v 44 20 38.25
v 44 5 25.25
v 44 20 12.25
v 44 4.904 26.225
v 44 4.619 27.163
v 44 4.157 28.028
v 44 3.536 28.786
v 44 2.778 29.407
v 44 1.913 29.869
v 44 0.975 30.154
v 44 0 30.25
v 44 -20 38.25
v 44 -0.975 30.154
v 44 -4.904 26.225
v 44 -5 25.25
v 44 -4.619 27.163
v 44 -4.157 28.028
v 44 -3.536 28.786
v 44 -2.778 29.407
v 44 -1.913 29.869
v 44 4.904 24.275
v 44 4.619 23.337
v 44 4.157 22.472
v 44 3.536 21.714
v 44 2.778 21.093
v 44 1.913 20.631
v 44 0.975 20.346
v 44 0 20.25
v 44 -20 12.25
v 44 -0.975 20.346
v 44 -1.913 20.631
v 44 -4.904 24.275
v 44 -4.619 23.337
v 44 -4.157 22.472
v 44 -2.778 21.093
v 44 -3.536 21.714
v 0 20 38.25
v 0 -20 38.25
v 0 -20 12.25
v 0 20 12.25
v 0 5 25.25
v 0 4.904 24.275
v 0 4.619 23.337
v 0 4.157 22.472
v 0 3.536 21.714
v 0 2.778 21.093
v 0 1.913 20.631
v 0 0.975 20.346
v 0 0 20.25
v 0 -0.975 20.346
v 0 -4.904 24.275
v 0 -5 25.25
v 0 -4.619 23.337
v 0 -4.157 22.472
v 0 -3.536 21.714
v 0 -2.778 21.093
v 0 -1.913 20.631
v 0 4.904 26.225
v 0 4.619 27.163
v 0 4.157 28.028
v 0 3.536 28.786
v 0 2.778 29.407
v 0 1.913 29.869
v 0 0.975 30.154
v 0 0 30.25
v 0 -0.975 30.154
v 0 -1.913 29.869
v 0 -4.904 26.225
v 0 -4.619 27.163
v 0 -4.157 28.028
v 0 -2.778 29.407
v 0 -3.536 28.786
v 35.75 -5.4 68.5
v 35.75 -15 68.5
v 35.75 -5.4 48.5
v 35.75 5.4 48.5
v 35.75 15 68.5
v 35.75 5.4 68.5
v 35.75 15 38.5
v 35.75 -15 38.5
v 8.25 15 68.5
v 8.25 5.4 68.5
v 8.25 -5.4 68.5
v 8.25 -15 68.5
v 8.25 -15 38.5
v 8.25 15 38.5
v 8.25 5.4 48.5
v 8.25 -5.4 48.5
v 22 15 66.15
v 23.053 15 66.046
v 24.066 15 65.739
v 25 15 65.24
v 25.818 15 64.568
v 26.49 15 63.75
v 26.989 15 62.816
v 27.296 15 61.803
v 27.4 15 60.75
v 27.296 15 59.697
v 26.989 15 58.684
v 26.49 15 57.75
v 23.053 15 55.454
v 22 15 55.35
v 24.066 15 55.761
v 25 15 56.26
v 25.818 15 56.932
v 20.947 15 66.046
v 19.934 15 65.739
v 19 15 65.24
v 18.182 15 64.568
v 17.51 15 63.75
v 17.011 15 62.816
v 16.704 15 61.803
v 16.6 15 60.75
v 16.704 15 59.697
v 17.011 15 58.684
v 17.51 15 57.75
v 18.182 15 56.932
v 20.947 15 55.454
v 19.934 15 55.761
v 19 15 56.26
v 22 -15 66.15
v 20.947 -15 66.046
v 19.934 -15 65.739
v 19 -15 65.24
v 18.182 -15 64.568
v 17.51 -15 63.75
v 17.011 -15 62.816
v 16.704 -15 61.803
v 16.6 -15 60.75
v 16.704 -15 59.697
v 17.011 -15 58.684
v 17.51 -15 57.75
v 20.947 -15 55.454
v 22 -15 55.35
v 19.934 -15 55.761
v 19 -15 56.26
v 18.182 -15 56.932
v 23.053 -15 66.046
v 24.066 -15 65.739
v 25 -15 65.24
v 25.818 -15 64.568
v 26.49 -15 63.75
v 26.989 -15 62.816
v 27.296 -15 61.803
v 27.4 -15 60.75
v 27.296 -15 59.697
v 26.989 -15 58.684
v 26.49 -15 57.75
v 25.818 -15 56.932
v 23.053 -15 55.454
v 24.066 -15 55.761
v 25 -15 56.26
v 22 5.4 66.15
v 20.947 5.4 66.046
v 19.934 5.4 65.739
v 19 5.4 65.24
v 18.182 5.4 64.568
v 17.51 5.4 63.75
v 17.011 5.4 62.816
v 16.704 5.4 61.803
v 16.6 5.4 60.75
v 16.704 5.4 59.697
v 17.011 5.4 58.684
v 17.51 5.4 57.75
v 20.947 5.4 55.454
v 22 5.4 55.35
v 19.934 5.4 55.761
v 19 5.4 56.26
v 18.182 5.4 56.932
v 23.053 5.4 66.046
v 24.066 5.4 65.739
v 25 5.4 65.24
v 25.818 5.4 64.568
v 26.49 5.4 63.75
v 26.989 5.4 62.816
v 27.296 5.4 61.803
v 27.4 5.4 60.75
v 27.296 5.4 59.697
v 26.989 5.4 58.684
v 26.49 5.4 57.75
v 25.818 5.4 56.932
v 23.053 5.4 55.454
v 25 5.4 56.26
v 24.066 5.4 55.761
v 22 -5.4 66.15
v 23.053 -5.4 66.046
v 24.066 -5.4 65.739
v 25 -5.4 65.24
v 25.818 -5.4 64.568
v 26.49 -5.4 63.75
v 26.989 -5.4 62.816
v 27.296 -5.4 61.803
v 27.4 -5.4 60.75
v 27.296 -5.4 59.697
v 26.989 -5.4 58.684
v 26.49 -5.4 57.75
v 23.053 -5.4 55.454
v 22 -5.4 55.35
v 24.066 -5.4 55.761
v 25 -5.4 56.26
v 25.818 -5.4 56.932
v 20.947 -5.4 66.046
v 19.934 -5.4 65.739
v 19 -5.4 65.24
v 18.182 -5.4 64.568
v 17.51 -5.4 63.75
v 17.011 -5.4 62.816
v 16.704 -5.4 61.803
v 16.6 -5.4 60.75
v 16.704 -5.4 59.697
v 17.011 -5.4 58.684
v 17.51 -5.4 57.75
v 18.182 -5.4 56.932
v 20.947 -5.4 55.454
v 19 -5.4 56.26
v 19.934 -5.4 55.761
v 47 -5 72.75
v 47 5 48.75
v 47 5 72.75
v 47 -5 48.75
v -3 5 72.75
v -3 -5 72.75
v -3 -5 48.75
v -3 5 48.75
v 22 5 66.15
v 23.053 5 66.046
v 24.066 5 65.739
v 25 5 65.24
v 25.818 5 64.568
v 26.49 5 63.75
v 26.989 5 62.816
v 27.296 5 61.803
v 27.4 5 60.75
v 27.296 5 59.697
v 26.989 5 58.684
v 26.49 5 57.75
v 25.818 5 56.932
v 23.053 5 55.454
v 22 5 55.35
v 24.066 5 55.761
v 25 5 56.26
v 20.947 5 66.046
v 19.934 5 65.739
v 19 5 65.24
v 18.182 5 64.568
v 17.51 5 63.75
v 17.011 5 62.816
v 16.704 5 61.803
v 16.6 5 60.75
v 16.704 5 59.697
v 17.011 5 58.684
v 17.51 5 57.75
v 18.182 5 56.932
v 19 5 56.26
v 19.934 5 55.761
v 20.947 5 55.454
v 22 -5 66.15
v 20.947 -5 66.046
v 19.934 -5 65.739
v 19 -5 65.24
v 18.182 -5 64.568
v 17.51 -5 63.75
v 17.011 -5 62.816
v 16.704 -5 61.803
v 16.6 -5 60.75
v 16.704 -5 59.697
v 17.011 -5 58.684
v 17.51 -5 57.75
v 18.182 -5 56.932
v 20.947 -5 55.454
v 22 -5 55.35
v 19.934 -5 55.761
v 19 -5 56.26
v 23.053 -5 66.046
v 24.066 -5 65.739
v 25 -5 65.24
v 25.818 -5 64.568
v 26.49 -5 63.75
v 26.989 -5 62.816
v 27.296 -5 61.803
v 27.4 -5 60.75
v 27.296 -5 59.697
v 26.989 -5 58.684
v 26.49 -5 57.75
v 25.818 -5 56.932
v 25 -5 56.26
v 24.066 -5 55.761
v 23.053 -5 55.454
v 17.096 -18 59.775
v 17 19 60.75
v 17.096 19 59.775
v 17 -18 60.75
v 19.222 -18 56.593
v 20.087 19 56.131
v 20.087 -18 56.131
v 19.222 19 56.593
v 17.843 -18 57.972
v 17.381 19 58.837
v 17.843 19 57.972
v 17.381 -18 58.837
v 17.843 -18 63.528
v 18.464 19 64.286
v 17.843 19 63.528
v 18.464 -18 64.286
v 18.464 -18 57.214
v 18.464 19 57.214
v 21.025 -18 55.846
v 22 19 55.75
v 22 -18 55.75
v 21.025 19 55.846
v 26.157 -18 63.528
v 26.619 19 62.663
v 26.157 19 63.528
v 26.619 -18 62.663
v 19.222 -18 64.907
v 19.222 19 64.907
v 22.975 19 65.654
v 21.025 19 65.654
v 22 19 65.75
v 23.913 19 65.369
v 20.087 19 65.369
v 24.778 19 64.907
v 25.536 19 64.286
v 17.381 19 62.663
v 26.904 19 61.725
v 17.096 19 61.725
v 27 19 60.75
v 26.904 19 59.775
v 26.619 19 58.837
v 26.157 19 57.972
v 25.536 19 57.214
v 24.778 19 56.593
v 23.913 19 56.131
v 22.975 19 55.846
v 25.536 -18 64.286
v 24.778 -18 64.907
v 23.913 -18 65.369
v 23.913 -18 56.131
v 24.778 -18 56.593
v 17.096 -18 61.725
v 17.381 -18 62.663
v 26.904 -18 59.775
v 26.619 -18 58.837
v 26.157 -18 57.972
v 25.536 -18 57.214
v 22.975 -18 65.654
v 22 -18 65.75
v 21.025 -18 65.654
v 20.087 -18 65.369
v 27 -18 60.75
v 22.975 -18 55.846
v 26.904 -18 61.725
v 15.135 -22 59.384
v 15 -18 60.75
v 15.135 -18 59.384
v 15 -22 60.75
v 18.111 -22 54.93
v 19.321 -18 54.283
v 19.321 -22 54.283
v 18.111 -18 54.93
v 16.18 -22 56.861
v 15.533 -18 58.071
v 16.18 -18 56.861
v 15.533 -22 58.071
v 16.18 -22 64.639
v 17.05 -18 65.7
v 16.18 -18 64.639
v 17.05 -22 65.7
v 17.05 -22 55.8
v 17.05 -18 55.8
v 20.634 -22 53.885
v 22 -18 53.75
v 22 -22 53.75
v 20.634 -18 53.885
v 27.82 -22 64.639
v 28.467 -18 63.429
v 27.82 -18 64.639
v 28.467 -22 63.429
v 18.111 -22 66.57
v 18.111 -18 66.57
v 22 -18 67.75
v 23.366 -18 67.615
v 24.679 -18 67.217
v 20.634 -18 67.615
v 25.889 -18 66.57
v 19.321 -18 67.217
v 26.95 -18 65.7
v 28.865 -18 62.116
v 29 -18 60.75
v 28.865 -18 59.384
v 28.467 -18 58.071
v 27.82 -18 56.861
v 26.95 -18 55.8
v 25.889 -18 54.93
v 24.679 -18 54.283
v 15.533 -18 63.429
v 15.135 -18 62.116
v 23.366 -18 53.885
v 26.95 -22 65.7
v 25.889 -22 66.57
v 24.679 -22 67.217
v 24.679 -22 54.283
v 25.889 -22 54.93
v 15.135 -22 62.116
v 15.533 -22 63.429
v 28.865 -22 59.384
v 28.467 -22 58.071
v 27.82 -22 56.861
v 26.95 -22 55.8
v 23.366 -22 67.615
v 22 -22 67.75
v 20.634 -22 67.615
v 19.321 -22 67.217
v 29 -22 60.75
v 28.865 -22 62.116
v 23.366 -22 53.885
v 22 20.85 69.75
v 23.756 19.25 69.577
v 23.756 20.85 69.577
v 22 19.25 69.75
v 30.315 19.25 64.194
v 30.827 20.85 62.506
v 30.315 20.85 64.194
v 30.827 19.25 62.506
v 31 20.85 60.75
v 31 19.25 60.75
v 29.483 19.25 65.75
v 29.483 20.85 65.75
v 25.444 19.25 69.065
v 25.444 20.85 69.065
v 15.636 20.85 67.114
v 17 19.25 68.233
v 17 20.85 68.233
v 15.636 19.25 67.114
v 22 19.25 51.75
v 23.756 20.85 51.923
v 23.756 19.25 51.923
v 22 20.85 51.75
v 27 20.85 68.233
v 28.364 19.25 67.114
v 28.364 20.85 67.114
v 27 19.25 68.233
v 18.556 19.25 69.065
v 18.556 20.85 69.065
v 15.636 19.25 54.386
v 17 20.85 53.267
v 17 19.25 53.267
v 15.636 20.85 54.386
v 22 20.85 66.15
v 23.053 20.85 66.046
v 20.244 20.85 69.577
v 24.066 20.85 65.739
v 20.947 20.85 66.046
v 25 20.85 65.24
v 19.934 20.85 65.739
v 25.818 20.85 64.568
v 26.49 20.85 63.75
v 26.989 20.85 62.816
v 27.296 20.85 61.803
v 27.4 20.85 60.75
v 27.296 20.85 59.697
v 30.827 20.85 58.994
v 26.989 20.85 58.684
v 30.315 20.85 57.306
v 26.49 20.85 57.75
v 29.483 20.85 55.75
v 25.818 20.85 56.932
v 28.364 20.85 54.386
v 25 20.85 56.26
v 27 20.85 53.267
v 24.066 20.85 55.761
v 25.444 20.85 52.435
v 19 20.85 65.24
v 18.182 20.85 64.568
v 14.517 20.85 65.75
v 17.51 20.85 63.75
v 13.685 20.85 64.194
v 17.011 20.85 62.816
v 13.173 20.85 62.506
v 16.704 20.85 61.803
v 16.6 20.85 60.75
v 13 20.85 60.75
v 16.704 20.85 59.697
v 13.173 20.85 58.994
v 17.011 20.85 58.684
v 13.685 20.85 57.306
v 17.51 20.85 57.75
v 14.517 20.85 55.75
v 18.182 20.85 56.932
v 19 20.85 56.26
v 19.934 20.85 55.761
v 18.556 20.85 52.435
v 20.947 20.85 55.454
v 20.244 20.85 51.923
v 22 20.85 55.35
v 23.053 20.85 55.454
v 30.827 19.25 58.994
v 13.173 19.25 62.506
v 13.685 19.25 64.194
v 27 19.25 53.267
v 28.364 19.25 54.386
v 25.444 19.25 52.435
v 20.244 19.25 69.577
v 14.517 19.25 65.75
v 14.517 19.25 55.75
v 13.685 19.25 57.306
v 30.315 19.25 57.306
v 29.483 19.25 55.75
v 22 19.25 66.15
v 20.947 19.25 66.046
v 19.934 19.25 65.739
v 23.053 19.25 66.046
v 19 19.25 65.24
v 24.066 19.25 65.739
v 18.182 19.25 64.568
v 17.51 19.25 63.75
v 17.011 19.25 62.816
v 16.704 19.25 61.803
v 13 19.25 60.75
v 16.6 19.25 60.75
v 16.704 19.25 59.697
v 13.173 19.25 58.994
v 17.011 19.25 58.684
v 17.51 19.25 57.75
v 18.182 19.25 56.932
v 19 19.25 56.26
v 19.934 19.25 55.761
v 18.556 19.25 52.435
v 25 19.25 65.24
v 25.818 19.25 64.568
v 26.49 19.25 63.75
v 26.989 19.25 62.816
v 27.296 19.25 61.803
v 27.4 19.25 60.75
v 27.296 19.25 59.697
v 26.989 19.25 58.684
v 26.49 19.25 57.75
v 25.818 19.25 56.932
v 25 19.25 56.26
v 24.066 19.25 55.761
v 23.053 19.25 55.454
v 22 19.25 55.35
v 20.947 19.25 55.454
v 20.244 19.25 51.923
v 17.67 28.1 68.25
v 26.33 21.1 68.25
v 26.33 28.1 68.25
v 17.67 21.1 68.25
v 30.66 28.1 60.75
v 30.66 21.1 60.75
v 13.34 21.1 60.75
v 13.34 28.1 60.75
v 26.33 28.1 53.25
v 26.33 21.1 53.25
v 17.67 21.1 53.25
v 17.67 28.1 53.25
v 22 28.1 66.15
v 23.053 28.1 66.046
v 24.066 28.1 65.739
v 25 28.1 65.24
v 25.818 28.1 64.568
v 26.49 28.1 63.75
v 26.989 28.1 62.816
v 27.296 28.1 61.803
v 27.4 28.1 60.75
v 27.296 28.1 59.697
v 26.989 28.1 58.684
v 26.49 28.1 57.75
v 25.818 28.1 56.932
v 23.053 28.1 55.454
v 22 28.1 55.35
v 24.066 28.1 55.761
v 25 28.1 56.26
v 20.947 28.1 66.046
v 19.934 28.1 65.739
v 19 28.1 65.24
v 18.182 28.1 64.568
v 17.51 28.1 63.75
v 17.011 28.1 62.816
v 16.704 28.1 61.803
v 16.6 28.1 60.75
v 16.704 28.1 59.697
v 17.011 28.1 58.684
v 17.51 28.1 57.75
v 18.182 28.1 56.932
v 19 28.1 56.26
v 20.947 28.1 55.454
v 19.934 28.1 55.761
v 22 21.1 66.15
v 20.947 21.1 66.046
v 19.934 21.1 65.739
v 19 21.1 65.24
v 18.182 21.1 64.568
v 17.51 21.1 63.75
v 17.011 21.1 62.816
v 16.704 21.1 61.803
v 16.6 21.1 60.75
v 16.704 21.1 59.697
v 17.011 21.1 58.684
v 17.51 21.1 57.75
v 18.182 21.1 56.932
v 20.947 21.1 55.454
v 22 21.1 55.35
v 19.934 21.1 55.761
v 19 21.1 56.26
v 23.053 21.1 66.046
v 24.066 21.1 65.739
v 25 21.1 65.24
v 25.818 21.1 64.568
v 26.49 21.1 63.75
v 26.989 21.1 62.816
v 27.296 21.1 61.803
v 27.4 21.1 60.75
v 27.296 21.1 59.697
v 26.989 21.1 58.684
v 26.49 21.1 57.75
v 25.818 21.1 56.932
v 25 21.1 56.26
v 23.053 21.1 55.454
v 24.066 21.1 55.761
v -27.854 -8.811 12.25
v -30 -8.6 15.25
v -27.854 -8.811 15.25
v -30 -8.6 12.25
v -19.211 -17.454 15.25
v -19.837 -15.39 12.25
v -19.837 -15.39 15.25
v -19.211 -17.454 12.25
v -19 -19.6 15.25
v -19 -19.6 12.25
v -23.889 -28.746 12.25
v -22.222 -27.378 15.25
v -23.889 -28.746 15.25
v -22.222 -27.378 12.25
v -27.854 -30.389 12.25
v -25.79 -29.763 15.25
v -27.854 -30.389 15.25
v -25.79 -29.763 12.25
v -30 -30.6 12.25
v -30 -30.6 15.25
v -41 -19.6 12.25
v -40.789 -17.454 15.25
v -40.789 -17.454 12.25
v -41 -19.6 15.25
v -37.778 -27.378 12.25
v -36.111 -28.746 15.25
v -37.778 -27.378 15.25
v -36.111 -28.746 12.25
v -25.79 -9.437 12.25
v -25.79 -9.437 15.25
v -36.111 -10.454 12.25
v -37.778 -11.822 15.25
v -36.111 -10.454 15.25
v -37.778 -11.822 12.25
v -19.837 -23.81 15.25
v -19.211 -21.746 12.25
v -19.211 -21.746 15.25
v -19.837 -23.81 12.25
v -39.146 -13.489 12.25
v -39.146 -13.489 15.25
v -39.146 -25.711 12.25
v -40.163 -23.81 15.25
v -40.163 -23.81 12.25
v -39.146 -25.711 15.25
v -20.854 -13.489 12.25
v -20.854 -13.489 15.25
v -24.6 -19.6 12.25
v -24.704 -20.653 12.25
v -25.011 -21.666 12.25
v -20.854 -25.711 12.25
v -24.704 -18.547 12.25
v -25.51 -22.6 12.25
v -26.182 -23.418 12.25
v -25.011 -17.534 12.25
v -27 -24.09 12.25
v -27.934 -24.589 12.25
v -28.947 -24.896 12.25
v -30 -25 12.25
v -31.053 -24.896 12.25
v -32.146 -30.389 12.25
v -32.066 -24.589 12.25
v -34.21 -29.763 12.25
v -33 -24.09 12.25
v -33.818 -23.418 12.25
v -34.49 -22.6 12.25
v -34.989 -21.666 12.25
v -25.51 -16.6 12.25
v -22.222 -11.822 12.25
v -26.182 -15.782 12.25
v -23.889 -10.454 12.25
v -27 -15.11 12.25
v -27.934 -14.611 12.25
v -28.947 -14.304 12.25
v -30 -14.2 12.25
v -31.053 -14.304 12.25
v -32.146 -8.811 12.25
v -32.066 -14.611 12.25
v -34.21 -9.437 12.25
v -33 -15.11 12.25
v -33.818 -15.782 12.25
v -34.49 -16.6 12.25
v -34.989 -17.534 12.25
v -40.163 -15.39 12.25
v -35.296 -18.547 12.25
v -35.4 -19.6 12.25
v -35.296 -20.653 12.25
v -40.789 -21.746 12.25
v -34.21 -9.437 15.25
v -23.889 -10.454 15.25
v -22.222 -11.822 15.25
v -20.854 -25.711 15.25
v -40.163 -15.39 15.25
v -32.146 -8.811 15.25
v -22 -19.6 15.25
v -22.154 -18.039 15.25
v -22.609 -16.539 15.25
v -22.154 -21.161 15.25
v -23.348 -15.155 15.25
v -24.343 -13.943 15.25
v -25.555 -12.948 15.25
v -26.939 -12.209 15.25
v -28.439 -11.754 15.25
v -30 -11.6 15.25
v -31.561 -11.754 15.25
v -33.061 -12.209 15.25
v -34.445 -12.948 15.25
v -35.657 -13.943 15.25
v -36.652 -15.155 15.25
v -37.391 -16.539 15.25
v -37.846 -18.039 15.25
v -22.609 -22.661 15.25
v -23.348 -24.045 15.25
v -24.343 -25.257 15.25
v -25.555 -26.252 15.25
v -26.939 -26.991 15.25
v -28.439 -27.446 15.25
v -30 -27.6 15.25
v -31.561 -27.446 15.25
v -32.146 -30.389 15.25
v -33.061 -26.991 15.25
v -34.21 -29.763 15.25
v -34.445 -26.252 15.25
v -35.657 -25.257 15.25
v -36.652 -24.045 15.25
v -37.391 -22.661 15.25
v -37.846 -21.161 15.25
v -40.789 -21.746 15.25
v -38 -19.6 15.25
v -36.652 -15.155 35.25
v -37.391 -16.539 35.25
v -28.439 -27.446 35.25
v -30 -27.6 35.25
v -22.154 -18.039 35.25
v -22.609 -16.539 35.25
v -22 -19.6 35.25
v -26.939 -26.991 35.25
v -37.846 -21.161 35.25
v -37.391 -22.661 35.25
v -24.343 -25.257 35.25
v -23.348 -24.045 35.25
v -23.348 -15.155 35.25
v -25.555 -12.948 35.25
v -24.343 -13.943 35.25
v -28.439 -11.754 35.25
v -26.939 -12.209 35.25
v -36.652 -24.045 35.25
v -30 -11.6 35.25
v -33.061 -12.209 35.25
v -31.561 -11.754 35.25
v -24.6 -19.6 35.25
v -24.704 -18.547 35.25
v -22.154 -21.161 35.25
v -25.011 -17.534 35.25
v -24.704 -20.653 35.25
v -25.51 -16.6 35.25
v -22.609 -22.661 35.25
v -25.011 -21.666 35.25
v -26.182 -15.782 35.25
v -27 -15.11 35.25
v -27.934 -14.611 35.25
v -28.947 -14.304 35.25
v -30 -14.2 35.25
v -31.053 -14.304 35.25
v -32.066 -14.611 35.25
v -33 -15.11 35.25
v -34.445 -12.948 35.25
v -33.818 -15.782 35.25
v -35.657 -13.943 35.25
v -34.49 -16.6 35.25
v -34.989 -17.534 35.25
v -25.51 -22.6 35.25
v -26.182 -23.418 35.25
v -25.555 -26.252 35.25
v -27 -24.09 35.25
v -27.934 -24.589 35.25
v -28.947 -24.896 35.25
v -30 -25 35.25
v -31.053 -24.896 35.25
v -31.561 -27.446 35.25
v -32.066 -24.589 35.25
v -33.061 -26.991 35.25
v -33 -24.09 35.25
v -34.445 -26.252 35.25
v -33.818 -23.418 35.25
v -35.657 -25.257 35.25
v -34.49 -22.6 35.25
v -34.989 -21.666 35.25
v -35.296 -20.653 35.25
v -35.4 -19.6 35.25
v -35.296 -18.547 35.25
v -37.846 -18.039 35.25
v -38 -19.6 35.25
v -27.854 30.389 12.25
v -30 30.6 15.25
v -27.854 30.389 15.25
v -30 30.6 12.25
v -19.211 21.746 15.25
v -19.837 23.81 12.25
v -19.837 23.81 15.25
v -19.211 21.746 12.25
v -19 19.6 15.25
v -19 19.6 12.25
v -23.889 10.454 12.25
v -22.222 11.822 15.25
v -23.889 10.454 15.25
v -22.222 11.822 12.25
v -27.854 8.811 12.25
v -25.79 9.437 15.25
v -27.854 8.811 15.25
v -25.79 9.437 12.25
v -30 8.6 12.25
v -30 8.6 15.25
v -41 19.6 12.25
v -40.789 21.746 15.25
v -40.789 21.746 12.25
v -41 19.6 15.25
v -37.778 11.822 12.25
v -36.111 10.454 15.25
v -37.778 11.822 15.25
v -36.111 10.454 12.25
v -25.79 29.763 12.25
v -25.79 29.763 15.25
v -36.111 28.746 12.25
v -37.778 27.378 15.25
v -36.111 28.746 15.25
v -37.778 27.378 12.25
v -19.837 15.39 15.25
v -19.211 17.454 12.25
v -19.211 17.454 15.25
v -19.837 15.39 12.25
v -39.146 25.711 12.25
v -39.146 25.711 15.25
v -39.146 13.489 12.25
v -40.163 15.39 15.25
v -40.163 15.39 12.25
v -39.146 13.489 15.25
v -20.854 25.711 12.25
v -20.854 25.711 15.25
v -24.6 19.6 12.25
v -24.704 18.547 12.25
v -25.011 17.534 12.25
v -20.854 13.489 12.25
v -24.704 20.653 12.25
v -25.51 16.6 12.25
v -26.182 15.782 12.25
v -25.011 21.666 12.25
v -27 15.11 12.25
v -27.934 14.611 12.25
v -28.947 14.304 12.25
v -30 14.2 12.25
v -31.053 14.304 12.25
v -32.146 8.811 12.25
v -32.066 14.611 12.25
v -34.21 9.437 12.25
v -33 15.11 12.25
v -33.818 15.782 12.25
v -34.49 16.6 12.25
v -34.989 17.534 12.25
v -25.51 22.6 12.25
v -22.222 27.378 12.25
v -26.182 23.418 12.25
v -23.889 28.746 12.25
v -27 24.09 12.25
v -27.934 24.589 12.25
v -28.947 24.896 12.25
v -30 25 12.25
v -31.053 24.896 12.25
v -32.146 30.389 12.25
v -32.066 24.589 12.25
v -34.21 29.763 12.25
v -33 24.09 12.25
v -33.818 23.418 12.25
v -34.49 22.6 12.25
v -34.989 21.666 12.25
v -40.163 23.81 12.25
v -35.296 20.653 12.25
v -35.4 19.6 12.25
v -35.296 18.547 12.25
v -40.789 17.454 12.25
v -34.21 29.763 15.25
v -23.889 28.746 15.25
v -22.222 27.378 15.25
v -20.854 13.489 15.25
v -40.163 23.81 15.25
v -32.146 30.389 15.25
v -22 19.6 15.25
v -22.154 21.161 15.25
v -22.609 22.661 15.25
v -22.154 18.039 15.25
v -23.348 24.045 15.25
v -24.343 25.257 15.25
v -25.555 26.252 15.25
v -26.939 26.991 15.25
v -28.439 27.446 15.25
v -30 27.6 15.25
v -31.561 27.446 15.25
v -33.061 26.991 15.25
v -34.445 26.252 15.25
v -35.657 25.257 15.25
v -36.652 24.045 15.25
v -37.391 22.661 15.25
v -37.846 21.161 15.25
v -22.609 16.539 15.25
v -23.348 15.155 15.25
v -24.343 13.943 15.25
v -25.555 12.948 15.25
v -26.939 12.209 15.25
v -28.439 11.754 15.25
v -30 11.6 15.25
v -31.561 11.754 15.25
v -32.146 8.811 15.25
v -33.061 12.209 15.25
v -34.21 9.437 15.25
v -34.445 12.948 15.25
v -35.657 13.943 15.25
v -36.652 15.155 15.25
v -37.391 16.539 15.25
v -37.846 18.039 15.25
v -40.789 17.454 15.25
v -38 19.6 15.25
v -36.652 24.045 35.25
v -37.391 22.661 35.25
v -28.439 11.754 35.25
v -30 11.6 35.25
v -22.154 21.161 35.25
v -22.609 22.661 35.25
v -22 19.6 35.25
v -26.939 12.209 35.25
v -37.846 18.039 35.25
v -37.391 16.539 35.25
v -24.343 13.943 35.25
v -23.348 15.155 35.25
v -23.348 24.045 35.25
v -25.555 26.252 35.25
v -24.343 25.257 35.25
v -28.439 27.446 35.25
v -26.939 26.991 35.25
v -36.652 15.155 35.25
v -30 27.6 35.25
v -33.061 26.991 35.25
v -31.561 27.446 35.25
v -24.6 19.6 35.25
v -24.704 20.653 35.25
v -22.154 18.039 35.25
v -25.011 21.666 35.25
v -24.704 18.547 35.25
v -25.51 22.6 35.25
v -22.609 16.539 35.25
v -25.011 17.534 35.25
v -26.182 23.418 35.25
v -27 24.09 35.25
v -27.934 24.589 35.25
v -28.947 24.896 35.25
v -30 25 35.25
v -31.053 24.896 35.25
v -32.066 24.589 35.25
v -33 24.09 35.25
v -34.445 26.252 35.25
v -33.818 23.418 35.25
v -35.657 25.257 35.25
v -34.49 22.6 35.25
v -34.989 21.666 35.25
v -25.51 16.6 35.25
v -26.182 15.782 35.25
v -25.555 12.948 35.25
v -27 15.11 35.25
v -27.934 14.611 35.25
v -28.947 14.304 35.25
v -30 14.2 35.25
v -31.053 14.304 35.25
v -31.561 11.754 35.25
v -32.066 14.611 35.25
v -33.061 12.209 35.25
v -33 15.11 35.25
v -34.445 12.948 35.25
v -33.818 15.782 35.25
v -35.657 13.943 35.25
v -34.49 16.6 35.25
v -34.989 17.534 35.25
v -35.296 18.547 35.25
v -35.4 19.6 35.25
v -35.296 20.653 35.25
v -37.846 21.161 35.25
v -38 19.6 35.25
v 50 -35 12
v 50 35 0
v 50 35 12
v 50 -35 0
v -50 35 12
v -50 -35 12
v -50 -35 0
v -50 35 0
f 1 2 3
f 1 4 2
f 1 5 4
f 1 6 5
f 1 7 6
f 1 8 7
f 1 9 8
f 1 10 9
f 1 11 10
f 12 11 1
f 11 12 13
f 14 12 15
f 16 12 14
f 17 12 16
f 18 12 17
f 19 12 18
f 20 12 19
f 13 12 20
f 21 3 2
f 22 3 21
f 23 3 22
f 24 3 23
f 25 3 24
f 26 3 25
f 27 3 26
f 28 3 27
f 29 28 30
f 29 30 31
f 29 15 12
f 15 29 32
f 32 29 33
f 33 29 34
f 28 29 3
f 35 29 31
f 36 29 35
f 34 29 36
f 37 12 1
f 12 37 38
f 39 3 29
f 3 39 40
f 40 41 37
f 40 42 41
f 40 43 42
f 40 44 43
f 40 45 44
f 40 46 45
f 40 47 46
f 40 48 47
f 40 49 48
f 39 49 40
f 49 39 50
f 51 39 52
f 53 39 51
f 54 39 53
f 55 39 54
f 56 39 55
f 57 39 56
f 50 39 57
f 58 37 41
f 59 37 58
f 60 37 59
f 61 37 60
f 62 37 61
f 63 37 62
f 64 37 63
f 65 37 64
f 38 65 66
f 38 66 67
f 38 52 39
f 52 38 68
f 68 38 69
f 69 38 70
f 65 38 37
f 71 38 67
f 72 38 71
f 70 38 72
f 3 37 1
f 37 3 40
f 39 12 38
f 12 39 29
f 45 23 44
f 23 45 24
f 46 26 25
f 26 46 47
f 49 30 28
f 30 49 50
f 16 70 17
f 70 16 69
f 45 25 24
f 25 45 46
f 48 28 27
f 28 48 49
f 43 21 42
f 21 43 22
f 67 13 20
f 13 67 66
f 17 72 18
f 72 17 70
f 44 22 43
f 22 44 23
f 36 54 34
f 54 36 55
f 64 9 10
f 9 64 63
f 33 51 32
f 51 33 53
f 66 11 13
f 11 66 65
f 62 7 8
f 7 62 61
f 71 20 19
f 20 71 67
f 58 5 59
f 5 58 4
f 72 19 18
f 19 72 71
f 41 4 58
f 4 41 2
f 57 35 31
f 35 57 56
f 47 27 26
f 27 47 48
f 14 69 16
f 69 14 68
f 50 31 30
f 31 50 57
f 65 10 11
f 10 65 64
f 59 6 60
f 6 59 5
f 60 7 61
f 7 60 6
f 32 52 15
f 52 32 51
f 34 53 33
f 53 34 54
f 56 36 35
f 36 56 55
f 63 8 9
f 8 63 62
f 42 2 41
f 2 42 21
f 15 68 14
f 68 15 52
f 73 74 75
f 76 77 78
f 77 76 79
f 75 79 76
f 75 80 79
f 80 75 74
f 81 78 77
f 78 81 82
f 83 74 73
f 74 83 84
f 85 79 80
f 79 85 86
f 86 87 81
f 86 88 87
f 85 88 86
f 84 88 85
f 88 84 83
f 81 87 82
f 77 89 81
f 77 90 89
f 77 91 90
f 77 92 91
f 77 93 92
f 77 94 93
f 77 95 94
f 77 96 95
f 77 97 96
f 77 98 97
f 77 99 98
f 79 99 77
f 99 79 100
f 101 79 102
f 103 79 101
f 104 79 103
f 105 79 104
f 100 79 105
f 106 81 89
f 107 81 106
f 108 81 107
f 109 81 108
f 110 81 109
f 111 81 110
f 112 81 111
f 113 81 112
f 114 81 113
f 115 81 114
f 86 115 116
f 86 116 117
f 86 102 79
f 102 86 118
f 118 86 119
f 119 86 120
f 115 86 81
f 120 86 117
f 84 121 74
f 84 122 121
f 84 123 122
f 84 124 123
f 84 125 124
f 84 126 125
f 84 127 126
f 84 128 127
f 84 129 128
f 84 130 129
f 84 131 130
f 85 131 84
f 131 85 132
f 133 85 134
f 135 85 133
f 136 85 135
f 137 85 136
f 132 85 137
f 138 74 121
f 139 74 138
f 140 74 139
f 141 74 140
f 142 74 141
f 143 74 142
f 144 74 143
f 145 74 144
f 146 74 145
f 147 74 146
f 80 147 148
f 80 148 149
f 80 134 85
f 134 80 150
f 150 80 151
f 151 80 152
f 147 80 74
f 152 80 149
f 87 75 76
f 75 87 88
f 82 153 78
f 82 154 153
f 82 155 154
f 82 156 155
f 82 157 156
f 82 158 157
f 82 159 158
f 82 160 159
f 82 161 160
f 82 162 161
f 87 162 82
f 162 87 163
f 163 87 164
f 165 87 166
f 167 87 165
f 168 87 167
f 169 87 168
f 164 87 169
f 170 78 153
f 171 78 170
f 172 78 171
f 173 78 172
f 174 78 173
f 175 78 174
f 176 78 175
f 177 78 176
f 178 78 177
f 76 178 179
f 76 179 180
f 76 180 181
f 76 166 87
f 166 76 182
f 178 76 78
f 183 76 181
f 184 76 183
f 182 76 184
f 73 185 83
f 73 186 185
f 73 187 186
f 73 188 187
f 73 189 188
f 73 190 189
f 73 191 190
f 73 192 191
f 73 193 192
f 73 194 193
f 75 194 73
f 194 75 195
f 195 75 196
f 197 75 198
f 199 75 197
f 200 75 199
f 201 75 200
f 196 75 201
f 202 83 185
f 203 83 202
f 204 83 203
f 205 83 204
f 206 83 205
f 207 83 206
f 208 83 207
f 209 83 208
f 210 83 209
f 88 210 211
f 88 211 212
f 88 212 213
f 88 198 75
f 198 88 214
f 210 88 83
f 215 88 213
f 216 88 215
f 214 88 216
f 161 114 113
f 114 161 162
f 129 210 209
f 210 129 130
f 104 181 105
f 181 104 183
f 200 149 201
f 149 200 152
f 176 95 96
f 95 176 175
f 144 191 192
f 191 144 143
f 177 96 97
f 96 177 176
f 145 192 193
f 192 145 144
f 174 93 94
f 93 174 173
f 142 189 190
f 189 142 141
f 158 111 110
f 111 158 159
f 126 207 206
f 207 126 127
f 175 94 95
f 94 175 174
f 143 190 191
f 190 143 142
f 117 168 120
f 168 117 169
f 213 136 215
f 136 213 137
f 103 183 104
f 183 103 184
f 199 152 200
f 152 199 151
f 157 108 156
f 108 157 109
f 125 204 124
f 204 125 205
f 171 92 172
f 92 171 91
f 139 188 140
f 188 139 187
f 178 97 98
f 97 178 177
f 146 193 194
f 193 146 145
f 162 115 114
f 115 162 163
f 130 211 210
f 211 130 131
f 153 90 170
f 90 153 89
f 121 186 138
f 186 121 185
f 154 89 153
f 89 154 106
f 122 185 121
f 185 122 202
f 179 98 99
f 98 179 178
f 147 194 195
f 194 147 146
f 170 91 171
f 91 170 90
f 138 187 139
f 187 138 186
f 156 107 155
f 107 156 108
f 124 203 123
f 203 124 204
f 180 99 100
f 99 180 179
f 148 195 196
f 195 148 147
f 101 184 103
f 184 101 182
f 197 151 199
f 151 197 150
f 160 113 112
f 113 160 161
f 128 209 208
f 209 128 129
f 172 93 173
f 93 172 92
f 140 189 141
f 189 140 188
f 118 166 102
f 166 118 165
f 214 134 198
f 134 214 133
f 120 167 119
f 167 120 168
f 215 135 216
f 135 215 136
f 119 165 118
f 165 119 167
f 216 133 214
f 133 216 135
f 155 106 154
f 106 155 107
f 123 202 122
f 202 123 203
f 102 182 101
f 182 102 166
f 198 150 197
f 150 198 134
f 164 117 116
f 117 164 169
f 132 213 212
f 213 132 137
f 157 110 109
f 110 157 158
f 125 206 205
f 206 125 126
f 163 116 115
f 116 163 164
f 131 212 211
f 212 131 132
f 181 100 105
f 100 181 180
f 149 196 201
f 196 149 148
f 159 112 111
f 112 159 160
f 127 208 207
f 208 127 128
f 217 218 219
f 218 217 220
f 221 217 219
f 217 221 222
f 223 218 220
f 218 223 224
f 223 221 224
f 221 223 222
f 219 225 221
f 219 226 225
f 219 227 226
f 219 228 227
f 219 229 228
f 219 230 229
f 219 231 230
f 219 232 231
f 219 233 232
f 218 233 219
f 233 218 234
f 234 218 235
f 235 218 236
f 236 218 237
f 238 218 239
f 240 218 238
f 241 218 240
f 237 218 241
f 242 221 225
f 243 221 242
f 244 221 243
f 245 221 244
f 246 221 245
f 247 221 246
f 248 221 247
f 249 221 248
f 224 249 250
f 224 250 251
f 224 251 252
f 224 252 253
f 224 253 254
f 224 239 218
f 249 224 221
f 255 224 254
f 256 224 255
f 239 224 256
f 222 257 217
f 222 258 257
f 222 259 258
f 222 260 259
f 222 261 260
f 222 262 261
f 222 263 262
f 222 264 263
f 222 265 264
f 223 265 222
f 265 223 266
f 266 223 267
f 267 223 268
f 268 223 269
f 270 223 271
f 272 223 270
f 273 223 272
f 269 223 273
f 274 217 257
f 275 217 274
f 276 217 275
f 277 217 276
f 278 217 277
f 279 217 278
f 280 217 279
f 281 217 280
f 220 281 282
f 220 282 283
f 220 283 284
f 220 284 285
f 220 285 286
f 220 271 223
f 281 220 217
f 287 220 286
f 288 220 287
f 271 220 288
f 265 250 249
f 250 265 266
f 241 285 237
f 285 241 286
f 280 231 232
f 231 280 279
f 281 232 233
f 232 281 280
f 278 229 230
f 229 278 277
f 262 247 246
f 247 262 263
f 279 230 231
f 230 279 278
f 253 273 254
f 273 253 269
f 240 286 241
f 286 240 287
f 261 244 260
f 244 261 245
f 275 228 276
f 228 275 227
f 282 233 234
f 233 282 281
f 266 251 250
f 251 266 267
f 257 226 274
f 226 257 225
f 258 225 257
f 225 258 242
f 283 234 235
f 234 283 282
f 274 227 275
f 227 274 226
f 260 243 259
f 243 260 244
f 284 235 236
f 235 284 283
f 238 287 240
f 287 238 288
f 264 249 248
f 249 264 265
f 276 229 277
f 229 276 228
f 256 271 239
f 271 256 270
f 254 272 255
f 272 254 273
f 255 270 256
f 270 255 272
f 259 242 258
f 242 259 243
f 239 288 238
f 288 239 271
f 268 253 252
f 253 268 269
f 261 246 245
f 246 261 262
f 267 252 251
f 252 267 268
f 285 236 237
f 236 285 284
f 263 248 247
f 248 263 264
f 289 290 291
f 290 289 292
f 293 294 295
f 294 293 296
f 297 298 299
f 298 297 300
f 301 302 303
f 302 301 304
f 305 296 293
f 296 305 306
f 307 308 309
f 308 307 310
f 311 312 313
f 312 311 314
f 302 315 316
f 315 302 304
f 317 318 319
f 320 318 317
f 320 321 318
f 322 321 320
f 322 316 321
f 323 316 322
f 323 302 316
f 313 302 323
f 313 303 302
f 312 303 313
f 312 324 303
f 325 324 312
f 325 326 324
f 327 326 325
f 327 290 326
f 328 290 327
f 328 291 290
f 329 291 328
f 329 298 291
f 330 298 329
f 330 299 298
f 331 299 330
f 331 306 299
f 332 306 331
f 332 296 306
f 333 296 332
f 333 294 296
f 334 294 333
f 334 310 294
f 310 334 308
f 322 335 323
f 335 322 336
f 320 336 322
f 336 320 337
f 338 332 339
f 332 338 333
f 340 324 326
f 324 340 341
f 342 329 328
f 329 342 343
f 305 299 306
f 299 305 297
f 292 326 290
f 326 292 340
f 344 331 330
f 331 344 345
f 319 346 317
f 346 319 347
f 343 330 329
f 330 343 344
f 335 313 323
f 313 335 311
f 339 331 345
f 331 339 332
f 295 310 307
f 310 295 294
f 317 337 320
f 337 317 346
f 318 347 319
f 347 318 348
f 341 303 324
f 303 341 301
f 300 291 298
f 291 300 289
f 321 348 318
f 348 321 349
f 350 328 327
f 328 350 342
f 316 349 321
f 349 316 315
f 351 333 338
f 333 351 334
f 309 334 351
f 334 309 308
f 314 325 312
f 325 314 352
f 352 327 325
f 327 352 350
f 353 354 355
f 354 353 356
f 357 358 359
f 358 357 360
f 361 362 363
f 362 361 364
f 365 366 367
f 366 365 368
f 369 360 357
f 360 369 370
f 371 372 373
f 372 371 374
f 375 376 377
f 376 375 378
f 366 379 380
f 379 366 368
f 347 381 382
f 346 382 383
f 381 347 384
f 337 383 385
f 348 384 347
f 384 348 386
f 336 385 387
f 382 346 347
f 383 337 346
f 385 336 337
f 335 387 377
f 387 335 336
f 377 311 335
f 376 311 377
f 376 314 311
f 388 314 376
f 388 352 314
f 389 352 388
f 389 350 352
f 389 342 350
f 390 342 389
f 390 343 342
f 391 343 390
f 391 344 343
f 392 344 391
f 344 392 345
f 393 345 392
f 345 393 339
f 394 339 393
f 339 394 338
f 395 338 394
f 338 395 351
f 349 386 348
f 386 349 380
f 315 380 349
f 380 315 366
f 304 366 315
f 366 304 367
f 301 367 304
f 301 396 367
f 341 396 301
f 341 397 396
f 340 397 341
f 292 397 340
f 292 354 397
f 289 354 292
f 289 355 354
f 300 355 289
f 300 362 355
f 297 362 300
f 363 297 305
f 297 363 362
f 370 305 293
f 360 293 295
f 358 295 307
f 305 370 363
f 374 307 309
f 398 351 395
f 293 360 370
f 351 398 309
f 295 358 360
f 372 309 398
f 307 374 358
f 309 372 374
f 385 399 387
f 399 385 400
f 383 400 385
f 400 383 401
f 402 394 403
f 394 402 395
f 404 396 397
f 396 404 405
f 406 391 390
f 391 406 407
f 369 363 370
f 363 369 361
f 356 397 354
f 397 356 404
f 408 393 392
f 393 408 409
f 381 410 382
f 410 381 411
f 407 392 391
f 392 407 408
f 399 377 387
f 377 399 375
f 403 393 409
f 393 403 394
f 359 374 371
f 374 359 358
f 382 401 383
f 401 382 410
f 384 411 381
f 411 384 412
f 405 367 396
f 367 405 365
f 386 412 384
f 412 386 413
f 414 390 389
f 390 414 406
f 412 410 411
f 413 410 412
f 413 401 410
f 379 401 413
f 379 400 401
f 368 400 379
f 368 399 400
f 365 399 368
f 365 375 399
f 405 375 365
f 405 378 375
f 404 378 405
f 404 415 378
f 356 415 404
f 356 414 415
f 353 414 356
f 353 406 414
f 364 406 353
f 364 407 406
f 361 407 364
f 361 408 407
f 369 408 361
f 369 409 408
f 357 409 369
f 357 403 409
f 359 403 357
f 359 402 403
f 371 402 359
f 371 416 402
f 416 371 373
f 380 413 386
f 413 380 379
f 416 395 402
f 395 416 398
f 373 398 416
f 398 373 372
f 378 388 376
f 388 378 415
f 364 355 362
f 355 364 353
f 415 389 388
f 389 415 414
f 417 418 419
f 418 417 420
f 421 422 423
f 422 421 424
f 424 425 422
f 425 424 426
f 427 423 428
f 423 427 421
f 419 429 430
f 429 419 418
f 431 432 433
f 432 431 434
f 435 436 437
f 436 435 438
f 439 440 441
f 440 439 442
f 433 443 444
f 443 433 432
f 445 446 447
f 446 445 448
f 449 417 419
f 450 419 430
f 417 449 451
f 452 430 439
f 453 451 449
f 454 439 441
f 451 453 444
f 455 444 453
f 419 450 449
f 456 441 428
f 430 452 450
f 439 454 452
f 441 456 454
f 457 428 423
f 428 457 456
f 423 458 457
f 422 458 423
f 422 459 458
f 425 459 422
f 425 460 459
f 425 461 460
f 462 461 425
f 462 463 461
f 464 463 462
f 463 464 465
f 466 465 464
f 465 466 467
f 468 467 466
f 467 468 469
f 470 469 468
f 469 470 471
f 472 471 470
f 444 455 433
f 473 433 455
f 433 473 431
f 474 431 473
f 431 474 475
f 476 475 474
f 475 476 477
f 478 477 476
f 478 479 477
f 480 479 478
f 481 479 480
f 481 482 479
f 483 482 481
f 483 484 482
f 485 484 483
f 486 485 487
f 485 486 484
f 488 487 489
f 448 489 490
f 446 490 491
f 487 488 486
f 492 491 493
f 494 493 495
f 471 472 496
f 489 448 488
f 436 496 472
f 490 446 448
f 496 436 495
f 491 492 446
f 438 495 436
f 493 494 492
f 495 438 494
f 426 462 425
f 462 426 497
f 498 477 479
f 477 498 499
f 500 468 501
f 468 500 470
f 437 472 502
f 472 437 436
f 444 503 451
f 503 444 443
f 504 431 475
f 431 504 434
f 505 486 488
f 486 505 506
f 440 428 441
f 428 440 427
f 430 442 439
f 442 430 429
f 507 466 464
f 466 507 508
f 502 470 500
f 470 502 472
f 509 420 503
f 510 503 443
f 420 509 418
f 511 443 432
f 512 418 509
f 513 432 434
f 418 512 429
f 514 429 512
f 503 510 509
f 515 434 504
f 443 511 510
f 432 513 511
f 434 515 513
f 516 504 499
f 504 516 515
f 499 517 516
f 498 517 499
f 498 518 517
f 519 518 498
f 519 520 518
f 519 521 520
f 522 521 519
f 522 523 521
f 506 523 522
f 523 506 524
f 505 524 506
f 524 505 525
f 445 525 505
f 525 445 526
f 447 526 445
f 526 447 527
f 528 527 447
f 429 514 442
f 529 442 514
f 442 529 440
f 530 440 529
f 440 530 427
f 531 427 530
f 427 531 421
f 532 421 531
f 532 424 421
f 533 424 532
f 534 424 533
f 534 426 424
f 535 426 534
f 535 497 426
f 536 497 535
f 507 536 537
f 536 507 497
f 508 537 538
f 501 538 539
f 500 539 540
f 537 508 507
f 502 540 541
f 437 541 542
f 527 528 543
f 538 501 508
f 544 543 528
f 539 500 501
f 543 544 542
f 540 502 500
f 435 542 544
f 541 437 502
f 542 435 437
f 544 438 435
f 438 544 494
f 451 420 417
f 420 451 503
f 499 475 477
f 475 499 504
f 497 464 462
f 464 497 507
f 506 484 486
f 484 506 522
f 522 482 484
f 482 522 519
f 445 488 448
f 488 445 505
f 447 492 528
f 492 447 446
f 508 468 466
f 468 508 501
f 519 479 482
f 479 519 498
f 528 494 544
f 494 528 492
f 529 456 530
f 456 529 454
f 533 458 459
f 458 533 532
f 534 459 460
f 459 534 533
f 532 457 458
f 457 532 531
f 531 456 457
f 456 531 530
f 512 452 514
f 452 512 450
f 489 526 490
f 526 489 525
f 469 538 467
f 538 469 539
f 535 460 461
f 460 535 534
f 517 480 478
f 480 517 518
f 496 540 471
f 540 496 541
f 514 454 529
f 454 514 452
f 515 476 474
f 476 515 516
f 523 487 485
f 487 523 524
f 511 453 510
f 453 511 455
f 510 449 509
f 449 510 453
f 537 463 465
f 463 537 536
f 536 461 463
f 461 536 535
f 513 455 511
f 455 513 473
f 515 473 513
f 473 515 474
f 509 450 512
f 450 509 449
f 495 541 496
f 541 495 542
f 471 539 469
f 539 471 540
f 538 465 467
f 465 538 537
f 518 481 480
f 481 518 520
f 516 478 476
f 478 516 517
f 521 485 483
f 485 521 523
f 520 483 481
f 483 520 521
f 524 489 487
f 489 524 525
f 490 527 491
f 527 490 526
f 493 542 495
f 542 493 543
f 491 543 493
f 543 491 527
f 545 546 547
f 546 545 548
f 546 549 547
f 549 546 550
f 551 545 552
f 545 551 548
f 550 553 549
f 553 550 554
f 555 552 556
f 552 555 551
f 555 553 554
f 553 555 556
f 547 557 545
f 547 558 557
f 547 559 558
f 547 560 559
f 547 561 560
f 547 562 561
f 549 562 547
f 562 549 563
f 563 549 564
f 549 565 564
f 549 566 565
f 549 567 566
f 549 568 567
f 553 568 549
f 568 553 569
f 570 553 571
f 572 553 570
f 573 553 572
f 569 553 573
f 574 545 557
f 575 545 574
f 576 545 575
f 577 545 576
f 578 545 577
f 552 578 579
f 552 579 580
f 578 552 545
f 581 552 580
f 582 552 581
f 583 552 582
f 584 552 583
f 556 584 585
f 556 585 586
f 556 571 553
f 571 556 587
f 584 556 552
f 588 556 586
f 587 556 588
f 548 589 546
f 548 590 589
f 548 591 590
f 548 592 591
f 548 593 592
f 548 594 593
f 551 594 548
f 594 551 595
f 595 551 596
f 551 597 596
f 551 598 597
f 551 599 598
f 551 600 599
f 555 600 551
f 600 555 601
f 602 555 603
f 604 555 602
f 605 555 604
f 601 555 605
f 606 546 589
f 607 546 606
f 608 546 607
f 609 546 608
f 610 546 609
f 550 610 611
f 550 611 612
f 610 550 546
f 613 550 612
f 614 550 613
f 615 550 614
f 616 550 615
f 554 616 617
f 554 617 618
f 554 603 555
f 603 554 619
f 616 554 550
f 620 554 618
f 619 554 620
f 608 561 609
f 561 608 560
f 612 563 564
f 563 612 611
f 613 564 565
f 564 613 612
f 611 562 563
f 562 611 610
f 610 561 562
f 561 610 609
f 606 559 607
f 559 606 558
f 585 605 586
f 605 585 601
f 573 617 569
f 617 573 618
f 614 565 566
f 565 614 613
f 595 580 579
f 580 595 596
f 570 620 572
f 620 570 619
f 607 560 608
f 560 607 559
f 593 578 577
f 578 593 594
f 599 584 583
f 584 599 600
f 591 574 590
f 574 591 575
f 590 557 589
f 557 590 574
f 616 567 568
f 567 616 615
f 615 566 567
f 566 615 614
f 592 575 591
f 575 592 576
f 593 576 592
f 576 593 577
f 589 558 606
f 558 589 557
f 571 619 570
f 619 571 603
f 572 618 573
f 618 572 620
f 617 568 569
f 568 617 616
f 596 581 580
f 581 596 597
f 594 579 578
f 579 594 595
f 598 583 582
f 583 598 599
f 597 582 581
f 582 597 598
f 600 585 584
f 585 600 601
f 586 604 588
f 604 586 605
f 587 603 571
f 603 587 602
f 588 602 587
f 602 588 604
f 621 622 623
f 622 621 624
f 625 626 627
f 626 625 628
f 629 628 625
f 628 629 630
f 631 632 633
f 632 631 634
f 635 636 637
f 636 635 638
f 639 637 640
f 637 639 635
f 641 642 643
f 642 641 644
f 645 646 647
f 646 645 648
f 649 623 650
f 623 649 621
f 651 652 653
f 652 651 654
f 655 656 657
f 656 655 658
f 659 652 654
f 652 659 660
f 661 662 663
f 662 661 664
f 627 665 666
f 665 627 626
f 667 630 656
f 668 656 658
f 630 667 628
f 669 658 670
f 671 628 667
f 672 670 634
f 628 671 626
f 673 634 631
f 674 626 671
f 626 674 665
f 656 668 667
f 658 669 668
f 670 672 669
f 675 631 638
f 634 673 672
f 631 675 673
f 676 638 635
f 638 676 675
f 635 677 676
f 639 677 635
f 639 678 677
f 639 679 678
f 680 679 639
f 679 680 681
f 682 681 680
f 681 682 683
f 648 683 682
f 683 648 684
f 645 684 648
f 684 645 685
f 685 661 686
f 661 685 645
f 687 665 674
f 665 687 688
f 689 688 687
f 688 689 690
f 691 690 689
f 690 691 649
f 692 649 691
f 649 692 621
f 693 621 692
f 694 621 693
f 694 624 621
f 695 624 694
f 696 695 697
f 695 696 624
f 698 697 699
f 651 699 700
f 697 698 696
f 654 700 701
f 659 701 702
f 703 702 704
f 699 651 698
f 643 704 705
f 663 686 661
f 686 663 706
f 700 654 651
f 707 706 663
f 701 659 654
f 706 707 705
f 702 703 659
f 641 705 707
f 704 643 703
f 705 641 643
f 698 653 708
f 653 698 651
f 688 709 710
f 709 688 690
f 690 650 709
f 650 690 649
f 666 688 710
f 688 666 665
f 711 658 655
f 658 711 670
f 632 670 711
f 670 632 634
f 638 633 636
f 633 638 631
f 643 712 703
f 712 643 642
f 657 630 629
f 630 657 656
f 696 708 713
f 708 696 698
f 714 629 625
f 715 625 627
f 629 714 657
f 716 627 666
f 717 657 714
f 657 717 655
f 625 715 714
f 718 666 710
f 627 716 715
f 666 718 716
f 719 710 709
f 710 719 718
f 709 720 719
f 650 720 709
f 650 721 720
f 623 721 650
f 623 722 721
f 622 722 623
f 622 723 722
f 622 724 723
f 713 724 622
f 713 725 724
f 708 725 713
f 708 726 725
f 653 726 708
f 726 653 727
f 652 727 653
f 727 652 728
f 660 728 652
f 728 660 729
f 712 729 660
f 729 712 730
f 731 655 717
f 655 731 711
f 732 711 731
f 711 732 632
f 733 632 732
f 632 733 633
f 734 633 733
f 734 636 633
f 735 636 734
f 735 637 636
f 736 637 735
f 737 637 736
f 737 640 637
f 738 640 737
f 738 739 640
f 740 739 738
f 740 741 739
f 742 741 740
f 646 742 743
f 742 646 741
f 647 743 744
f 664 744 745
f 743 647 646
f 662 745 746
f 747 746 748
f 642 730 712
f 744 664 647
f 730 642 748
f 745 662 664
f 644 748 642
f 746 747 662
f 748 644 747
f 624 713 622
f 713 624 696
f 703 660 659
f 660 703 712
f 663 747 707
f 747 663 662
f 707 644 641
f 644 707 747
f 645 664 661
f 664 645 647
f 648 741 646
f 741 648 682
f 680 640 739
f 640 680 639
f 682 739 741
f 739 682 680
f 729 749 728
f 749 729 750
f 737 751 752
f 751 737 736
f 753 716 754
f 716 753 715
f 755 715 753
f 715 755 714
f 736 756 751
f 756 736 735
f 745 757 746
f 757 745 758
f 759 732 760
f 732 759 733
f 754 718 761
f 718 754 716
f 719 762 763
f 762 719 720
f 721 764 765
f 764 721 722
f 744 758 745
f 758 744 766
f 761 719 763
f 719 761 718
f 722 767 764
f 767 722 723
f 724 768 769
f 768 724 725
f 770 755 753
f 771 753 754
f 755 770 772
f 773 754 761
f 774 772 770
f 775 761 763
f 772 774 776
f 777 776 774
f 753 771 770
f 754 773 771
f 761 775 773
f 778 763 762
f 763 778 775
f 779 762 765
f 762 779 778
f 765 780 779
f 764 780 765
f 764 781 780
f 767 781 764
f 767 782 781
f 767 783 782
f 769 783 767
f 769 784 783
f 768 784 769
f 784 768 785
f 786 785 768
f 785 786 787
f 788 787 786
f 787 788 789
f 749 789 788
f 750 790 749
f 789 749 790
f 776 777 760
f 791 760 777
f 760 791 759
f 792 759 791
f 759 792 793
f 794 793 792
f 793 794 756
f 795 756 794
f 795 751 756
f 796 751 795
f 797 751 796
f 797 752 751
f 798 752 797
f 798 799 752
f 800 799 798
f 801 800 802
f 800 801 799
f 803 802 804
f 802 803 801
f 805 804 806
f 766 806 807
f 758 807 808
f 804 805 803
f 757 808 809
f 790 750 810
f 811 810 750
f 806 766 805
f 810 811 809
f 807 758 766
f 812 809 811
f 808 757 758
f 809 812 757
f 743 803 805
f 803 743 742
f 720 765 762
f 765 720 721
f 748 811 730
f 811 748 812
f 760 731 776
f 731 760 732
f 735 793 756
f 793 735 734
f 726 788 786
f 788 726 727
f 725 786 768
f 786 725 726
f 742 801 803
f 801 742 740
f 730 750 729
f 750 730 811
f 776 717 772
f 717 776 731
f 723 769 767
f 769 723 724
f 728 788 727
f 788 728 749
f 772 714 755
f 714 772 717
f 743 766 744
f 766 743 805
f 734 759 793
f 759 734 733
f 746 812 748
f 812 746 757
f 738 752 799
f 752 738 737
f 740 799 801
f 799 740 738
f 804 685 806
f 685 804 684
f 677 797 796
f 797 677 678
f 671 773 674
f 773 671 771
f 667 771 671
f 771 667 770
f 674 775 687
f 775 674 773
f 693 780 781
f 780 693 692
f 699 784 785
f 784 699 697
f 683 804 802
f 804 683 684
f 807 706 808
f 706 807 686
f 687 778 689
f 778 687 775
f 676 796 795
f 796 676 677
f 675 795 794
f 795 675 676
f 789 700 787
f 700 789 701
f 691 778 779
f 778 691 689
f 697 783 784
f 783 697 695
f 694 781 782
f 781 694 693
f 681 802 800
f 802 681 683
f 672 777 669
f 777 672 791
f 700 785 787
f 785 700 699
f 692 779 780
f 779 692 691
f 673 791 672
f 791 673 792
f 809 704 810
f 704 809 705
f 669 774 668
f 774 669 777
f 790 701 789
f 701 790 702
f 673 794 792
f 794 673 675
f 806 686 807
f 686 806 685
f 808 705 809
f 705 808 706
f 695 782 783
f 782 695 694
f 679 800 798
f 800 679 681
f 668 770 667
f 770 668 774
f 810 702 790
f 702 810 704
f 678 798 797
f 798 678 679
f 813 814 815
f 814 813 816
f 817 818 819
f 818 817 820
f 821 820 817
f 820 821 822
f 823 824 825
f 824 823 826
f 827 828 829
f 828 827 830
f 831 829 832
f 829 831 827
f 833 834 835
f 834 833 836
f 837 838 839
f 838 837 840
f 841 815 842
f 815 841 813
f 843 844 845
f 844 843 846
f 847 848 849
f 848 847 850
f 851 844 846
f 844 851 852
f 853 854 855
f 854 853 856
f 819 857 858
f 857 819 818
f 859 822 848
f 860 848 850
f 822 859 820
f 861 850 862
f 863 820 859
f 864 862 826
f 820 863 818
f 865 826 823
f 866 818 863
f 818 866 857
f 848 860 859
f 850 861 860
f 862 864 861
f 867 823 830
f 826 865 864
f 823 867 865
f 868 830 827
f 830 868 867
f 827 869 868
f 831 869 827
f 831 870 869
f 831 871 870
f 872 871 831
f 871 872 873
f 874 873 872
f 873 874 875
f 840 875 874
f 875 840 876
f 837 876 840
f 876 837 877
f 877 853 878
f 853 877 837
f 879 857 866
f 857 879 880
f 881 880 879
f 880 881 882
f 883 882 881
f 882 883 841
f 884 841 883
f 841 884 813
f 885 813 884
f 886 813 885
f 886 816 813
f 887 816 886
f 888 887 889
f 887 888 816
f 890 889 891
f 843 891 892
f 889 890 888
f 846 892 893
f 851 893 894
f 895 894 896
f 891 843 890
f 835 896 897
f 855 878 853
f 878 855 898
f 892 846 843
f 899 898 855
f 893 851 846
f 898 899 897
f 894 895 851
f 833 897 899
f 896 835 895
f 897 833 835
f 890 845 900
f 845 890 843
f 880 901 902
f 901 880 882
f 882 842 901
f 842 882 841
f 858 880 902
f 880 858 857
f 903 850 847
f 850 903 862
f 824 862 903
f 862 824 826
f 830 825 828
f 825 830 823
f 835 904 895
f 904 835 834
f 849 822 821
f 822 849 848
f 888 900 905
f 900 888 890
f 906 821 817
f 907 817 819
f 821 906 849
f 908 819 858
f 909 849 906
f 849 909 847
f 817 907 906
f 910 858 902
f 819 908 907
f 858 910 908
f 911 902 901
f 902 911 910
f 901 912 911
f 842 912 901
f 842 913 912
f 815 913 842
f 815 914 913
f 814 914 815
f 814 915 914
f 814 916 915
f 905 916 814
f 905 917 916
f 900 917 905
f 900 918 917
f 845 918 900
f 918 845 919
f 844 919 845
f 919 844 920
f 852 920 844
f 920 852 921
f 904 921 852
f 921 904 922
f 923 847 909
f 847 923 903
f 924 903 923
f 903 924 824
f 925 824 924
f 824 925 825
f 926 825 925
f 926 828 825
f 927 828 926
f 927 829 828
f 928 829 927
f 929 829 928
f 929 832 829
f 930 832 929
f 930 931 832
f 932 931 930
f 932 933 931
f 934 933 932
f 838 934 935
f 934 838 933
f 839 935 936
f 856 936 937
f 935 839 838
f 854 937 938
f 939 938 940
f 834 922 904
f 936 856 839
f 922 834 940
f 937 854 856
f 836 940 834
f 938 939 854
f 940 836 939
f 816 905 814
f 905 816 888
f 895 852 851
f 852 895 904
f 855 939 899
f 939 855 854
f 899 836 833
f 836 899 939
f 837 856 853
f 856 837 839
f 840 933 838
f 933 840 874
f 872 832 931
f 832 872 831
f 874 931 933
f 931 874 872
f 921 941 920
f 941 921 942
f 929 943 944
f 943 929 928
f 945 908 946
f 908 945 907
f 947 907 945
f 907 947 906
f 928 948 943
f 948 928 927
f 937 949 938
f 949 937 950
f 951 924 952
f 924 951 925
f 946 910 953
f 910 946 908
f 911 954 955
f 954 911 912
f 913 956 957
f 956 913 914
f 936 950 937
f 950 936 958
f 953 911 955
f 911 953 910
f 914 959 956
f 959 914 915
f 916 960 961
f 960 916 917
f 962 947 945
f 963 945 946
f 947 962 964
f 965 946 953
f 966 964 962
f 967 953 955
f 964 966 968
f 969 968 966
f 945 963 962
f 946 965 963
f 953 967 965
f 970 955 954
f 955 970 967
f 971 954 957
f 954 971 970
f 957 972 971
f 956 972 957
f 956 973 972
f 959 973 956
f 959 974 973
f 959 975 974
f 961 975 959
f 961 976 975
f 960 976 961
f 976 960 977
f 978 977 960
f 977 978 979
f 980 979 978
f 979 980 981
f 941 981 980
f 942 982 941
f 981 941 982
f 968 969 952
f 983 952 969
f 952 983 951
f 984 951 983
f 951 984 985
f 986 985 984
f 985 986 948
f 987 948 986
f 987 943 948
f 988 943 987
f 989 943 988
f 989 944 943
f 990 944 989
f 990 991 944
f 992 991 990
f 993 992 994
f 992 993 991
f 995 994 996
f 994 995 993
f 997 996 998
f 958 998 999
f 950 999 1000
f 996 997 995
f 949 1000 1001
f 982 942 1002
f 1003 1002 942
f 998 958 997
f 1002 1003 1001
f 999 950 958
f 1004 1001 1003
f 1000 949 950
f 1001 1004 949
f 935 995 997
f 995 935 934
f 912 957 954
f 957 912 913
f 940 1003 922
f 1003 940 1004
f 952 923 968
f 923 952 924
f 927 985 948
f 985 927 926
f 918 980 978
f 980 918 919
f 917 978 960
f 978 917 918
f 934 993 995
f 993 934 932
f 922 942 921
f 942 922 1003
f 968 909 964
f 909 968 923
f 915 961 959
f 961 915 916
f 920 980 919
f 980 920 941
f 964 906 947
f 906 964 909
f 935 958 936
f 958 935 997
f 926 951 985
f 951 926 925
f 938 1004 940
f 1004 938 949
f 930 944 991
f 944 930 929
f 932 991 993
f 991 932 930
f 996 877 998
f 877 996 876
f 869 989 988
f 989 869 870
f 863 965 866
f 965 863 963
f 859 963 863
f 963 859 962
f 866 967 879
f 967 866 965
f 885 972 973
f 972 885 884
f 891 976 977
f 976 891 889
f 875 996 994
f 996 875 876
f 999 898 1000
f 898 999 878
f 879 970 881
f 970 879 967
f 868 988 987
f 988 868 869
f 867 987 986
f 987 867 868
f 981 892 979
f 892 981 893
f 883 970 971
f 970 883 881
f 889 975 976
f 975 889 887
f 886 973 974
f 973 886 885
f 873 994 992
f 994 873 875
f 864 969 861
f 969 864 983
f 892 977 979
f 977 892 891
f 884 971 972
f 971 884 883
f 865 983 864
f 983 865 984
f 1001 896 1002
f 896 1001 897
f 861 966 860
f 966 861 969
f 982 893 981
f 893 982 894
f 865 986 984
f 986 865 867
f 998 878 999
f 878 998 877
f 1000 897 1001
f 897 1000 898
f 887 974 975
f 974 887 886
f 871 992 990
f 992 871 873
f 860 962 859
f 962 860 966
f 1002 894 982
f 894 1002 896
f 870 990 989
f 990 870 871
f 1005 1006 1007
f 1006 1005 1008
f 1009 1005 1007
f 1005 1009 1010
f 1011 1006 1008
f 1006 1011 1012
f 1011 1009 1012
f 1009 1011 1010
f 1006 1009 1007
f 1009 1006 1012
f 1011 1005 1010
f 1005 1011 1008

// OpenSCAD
$fn = 32;

// ------------------------------------------------------------------------
// Indexing jig: plate 100 x 70 mm, pin d10
// Every part is its own module, assembly() places every instance.
// ------------------------------------------------------------------------

// --- part 1 ---
module jig_plate() {
  difference() {
    translate([-50, -35, 0]) cube([100, 70, 12]);
  }
}

// --- part 2 ---
module locator_block() {
  difference() {
    translate([-22, -20, 0]) cube([44, 40, 26]);
    translate([0, 0, 13]) rotate([0, 90, 0]) cylinder(h = 46, d = 10, center = true);
  }
}

// --- part 3 ---
module index_fork() {
  difference() {
    translate([-13.75, -15, 0]) cube([27.5, 30, 30]);
    translate([-14.75, -5.4, 10]) cube([29.5, 10.8, 21]);
    translate([0, 0, 22.25]) rotate([90, 0, 0]) cylinder(h = 32, d = 10.8, center = true);
  }
}

// --- part 4 ---
module index_arm() {
  difference() {
    translate([-25, -5, 0]) cube([50, 10, 24]);
    translate([0, 0, 12]) rotate([90, 0, 0]) cylinder(h = 12, d = 10.8, center = true);
  }
}

// --- part 5 ---
module index_pin() {
  rotate([0, 90, 0]) cylinder(h = 38, d = 10, center = true);
  translate([-22, 0, 0]) rotate([0, 90, 0]) cylinder(h = 4, d = 14);
}

// --- part 6 ---
module pin_washer() {
  difference() {
      translate([0, 0, 0]) cylinder(h = 1.6, d = 18);
      translate([0, 0, -1]) cylinder(h = 3.6, d = 10.8);
    }
}

// --- part 7 ---
module lock_nut() {
  difference() {
    linear_extrude(height = 7) polygon(points = [[8.66, 0], [4.33, 7.5], [-4.33, 7.5], [-8.66, 0], [-4.33, -7.5], [4.33, -7.5]]);
    translate([0, 0, -1]) cylinder(h = 9, d = 10.8);
  }
}

// --- part 8 ---
module guide_bush_a() {
  difference() {
    union() {
      cylinder(h = 3, d = 22);
      translate([0, 0, 3]) cylinder(h = 20, d = 16);
    }
    translate([0, 0, -1]) cylinder(h = 25, d = 10.8);
  }
}

// --- part 9 ---
module guide_bush_b() {
  difference() {
    union() {
      cylinder(h = 3, d = 22);
      translate([0, 0, 3]) cylinder(h = 20, d = 16);
    }
    translate([0, 0, -1]) cylinder(h = 25, d = 10.8);
  }
}

// --- assembly ---
module assembly() {
  color([0.80, 0.24, 0.20]) translate([0, 0, 0]) rotate([0, 0, 0]) jig_plate();
  color([0.20, 0.45, 0.75]) translate([22, 0, 12.25]) rotate([0, 0, 0]) locator_block();
  color([0.25, 0.62, 0.32]) translate([22, 0, 38.5]) rotate([0, 0, 0]) index_fork();
  color([0.92, 0.70, 0.18]) translate([22, 0, 48.75]) rotate([0, 0, 0]) index_arm();
  color([0.58, 0.35, 0.70]) translate([22, 0, 60.75]) rotate([0, 0, 90]) index_pin();
  color([0.16, 0.66, 0.66]) translate([22, 20.85, 60.75]) rotate([90, 0, 0]) pin_washer();
  color([0.85, 0.48, 0.18]) translate([22, 28.1, 60.75]) rotate([90, 0, 0]) lock_nut();
  color([0.55, 0.60, 0.65]) translate([-30, -19.6, 12.25]) rotate([0, 0, 0]) guide_bush_a();
  color([0.75, 0.30, 0.55]) translate([-30, 19.6, 12.25]) rotate([0, 0, 0]) guide_bush_b();
}

assembly();
